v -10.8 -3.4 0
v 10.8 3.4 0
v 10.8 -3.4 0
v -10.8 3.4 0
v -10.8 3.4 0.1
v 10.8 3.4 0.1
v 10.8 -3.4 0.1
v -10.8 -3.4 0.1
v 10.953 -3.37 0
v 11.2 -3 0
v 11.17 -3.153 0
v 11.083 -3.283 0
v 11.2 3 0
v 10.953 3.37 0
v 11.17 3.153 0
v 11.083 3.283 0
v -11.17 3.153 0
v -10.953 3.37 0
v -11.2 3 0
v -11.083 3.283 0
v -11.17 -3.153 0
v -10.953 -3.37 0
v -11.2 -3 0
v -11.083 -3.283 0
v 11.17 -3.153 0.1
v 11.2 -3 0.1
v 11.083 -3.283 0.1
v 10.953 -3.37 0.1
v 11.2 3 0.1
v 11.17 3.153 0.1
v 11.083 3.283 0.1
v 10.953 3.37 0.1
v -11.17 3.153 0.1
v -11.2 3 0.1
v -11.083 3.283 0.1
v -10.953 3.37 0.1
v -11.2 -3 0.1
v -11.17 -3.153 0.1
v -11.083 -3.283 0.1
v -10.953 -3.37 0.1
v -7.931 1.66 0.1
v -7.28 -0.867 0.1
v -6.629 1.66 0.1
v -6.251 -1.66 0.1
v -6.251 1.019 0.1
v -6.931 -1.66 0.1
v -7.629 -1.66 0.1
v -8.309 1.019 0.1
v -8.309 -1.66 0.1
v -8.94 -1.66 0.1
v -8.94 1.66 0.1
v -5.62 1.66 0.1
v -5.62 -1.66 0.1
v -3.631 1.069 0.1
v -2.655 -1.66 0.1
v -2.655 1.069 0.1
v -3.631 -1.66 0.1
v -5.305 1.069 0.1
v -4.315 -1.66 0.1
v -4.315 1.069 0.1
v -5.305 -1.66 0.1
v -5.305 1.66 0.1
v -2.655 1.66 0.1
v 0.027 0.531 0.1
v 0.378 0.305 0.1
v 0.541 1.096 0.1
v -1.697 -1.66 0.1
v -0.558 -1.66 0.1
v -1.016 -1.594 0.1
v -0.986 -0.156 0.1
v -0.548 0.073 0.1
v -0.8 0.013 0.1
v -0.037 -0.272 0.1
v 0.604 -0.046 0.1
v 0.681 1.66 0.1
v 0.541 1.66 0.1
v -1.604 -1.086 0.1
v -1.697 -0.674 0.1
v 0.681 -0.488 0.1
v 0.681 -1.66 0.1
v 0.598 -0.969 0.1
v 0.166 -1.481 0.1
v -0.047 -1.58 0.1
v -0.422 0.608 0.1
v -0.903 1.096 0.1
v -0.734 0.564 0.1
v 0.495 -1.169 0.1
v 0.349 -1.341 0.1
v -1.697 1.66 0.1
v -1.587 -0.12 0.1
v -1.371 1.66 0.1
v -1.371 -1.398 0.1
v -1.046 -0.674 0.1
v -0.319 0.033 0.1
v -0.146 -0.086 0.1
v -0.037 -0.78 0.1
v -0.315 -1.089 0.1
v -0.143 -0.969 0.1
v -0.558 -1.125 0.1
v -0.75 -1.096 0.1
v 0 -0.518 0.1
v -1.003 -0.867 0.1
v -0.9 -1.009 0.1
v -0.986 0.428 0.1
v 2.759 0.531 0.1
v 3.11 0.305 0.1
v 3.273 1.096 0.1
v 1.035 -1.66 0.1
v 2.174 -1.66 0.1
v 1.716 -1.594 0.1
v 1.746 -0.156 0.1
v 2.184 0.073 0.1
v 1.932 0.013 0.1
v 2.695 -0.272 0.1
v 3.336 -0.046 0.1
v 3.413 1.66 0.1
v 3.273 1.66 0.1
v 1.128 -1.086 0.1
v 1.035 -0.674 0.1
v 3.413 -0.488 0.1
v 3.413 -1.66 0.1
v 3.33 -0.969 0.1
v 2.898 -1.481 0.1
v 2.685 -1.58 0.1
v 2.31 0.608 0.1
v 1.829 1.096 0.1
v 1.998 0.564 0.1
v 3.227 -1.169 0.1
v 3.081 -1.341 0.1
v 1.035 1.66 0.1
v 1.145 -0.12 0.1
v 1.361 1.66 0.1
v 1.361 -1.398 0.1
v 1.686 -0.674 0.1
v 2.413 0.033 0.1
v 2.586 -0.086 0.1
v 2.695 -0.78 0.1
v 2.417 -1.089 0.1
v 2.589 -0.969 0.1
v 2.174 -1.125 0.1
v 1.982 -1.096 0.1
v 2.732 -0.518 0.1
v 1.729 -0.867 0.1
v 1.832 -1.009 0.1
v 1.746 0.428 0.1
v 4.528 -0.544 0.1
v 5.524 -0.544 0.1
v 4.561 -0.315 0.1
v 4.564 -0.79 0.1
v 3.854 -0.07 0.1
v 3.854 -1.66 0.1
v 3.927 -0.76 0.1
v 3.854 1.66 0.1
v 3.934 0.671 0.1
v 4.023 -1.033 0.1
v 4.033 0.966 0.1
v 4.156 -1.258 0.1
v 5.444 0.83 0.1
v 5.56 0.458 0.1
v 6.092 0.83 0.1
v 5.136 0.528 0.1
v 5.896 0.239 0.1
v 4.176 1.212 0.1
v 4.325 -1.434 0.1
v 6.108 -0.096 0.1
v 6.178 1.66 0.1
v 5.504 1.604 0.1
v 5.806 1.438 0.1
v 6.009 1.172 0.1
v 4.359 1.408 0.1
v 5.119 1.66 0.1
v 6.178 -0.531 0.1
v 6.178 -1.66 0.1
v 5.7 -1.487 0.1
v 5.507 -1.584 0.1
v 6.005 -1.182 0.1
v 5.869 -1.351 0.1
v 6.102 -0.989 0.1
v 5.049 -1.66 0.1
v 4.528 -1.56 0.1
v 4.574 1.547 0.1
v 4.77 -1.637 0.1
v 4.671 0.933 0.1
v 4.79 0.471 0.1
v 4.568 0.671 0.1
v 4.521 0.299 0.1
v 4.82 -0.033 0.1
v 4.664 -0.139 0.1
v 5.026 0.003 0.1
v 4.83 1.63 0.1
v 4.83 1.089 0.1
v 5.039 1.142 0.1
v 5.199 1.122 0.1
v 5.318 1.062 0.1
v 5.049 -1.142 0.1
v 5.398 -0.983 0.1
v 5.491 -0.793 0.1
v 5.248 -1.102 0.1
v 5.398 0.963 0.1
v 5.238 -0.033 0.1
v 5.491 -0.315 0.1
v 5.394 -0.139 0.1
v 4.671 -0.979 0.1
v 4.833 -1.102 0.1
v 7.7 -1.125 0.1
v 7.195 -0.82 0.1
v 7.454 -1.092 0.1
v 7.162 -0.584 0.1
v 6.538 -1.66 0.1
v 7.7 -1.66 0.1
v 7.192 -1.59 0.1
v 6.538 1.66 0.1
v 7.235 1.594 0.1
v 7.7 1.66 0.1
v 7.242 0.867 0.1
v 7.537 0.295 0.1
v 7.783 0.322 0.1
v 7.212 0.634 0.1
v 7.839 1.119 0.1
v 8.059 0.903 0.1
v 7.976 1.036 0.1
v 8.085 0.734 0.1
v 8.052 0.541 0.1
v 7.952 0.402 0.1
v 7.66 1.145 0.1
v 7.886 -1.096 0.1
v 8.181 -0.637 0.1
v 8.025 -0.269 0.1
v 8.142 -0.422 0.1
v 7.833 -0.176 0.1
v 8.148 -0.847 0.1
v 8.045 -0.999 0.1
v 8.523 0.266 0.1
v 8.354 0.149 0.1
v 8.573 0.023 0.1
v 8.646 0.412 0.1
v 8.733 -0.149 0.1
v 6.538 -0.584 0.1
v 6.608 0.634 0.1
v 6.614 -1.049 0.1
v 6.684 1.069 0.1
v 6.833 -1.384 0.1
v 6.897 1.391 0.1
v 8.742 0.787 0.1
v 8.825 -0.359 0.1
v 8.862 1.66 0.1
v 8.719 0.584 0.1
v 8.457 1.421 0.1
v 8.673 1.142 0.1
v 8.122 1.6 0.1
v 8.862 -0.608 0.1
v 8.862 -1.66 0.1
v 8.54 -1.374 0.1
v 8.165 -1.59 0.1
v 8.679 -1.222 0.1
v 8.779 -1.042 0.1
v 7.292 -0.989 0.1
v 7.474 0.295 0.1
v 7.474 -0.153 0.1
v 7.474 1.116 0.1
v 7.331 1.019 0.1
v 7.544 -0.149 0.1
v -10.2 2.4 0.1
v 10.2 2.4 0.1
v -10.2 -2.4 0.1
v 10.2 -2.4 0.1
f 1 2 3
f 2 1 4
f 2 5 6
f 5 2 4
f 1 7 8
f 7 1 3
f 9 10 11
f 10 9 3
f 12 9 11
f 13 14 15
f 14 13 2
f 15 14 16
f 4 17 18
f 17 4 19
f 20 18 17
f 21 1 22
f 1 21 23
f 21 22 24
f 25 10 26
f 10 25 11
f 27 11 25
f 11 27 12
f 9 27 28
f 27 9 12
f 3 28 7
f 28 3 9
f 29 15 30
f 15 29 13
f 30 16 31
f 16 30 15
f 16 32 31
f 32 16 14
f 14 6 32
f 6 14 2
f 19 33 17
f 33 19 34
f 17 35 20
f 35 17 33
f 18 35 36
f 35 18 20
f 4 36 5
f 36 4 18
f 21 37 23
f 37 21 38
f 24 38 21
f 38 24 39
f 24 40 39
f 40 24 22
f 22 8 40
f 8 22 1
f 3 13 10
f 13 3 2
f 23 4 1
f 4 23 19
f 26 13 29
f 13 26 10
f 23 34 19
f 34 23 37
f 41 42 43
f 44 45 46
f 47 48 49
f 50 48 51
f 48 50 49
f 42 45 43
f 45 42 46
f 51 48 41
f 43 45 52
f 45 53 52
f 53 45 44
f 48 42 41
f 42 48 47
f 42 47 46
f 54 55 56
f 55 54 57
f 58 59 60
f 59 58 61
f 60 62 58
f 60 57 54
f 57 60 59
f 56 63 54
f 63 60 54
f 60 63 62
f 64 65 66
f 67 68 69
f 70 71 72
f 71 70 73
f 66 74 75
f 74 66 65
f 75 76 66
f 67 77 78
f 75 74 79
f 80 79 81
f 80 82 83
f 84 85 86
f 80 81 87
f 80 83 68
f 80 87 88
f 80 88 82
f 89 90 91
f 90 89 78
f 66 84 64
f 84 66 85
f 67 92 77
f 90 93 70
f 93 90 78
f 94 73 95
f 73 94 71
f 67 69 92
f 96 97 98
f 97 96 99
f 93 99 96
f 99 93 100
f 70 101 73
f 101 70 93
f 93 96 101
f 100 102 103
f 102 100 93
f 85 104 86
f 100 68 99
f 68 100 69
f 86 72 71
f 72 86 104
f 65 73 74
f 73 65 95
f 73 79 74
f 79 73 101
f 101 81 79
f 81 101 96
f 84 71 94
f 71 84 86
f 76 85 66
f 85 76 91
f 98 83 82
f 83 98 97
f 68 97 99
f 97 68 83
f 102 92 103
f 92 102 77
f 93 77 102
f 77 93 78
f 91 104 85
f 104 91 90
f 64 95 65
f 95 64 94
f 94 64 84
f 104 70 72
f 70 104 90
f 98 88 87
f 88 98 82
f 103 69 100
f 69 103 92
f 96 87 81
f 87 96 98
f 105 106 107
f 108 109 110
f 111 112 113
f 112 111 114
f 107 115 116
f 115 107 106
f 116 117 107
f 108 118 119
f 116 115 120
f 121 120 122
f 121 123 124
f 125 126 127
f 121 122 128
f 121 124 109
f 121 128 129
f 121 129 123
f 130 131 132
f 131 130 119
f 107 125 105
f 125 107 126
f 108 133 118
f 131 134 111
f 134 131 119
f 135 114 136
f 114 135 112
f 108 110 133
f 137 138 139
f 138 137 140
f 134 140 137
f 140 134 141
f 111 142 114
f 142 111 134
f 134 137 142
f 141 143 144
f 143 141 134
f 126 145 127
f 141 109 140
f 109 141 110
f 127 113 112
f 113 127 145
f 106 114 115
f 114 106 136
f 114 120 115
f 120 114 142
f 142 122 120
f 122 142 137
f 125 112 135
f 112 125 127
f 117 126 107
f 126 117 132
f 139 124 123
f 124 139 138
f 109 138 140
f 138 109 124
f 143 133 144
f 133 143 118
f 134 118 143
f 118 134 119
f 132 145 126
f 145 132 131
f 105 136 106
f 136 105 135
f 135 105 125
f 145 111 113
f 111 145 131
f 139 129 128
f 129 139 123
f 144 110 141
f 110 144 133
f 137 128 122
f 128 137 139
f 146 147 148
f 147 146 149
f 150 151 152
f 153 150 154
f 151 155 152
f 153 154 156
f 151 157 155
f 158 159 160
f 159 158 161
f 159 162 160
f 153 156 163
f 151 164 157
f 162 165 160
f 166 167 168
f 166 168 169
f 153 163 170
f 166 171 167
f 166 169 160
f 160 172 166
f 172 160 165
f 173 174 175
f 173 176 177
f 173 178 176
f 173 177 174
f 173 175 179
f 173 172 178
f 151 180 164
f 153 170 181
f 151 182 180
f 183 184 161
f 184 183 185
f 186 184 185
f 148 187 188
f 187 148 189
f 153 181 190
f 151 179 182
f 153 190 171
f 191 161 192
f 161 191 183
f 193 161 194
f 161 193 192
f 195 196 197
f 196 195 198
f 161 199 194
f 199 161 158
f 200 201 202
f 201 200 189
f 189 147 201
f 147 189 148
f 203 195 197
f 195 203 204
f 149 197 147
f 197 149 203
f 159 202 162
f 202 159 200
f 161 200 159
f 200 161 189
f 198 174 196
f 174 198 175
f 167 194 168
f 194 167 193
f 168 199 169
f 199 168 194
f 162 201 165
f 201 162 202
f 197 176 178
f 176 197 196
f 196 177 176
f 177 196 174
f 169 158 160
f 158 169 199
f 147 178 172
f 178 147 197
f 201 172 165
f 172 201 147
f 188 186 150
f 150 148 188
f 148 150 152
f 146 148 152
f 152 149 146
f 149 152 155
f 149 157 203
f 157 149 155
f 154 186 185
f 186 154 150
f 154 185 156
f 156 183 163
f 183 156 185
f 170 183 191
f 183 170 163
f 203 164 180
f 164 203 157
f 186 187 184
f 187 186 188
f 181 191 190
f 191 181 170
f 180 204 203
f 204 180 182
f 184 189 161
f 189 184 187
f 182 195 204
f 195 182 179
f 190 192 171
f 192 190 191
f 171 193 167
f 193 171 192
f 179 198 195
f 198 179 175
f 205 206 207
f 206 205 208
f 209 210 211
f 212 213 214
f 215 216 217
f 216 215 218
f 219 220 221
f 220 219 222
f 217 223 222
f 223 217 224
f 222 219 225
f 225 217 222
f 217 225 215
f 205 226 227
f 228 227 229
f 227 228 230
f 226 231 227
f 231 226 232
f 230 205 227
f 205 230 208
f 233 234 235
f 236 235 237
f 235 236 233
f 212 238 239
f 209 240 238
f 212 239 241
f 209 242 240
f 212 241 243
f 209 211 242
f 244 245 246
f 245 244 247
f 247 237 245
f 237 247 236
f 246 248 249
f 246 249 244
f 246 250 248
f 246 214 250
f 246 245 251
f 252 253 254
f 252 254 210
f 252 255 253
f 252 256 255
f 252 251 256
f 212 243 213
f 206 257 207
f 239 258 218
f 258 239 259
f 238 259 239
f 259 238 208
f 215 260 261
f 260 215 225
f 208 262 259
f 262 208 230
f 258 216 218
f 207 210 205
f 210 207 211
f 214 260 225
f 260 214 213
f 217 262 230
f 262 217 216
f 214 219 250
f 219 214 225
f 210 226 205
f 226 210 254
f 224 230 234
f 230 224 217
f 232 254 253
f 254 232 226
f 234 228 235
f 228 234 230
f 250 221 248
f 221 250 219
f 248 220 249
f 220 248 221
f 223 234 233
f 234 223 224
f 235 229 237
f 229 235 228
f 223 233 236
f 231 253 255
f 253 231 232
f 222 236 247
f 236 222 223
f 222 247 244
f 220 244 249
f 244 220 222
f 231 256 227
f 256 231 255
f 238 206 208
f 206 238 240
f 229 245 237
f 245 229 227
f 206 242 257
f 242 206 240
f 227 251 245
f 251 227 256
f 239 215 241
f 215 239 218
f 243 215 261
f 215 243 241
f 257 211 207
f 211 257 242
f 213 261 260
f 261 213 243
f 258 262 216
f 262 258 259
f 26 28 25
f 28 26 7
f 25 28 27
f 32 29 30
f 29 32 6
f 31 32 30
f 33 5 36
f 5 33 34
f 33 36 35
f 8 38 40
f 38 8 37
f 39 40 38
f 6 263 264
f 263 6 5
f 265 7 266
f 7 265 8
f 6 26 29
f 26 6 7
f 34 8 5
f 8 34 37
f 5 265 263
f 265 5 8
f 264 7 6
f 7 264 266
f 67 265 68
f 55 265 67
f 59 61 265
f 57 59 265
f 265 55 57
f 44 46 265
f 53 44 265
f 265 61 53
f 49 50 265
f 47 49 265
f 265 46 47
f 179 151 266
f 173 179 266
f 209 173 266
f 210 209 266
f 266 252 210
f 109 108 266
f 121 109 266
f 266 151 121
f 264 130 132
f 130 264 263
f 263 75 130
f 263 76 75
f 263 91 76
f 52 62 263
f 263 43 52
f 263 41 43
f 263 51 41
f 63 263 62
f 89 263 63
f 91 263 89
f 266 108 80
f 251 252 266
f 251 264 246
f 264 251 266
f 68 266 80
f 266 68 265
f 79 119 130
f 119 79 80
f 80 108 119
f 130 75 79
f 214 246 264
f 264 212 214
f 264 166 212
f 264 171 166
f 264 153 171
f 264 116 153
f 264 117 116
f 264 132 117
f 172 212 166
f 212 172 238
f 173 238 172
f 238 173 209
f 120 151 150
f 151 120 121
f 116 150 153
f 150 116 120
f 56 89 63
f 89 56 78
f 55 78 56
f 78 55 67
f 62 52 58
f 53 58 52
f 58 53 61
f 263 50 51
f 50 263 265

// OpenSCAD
use <../lib.scad>
use <../p/1-4chrd.scad>
use <../p/1-4cyli.scad>
use <../p/box3u12.scad>
use <../p/type-swiss721bt-bold-n3.scad>
use <../p/type-swiss721bt-bold-n5.scad>
use <../p/type-swiss721bt-bold-n6.scad>
use <../p/type-swiss721bt-bold-um.scad>
use <../p/type-swiss721bt-bold-ut.scad>
$fa=1; $fs=0.2;
function ldraw_lib__4121723j(realsolid=false) = [
// 0 Sticker  0.85 x  2.8 with Black "MT 5563" on White Background
// 0 Name: 4121723j.dat
// 0 Author: Ulrich Röder [UR]
// 0 !LDRAW_ORG Part UPDATE 2022-01
// 0 !LICENSE Licensed under CC BY 2.0 and CC BY 4.0 : see CAreadme.txt
// 
// 0 BFC CERTIFY CCW
  [0,"BFC","CERTIFY"],
  [0,"BFC","CCW"],
// 
// 0 !KEYWORDS Model Team, Racing Truck, Set 5563
// 
// 0 !HISTORY 2022-01-14 [PTadmin] Official Update 2022-01
// 
// 
// 0 // Body
// 
// 1 16 0 -0.25 0 27 0 0 0 0.25 0 0 0 8.5 box3u12.dat
  [1,16,0,-0.25,0,27,0,0,0,0.25,0,0,0,8.5, ldraw_lib__box3u12(realsolid)],
// 1 16 27 0 -7.5 1 0 0 0 -1 0 0 0 -1 1-4chrd.dat
  [1,16,27,0,-7.5,1,0,0,0,-1,0,0,0,-1, ldraw_lib__1_4chrd(realsolid)],
// 1 16 27 0 7.5 1 0 0 0 -1 0 0 0 1 1-4chrd.dat
  [1,16,27,0,7.5,1,0,0,0,-1,0,0,0,1, ldraw_lib__1_4chrd(realsolid)],
// 1 16 -27 0 7.5 -1 0 0 0 -1 0 0 0 1 1-4chrd.dat
  [1,16,-27,0,7.5,-1,0,0,0,-1,0,0,0,1, ldraw_lib__1_4chrd(realsolid)],
// 1 16 -27 0 -7.5 -1 0 0 0 -1 0 0 0 -1 1-4chrd.dat
  [1,16,-27,0,-7.5,-1,0,0,0,-1,0,0,0,-1, ldraw_lib__1_4chrd(realsolid)],
// 1 16 27 -0.25 -7.5 1 0 0 0 0.25 0 0 0 -1 1-4cyli.dat
  [1,16,27,-0.25,-7.5,1,0,0,0,0.25,0,0,0,-1, ldraw_lib__1_4cyli(realsolid)],
// 1 16 27 -0.25 7.5 1 0 0 0 0.25 0 0 0 1 1-4cyli.dat
  [1,16,27,-0.25,7.5,1,0,0,0,0.25,0,0,0,1, ldraw_lib__1_4cyli(realsolid)],
// 1 16 -27 -0.25 7.5 -1 0 0 0 0.25 0 0 0 1 1-4cyli.dat
  [1,16,-27,-0.25,7.5,-1,0,0,0,0.25,0,0,0,1, ldraw_lib__1_4cyli(realsolid)],
// 1 16 -27 -0.25 -7.5 -1 0 0 0 0.25 0 0 0 -1 1-4cyli.dat
  [1,16,-27,-0.25,-7.5,-1,0,0,0,0.25,0,0,0,-1, ldraw_lib__1_4cyli(realsolid)],
// 4 16 27 0 8.5 28 0 7.5 28 0 -7.5 27 0 -8.5
  [4,16,27,0,8.5,28,0,7.5,28,0,-7.5,27,0,-8.5],
// 4 16 -27 0 -8.5 -28 0 -7.5 -28 0 7.5 -27 0 8.5
  [4,16,-27,0,-8.5,-28,0,-7.5,-28,0,7.5,-27,0,8.5],
// 4 16 28 0 7.5 28 -0.25 7.5 28 -0.25 -7.5 28 0 -7.5
  [4,16,28,0,7.5,28,-0.25,7.5,28,-0.25,-7.5,28,0,-7.5],
// 4 16 -28 0 -7.5 -28 -0.25 -7.5 -28 -0.25 7.5 -28 0 7.5
  [4,16,-28,0,-7.5,-28,-0.25,-7.5,-28,-0.25,7.5,-28,0,7.5],
// 
// 0 // Frontface
// 0 // Text
// 1 15 -18.2 -0.25 0 8.3 0 0 0 1 0 0 0 8.3 type-swiss721bt-bold-um.dat
  [1,15,-18.2,-0.25,0,8.3,0,0,0,1,0,0,0,8.3, ldraw_lib__type_swiss721bt_bold_um(realsolid)],
// 1 15 -9.95 -0.25 0 8.3 0 0 0 1 0 0 0 8.3 type-swiss721bt-bold-ut.dat
  [1,15,-9.95,-0.25,0,8.3,0,0,0,1,0,0,0,8.3, ldraw_lib__type_swiss721bt_bold_ut(realsolid)],
// 1 15 -1.27 -0.25 0 8.3 0 0 0 1 0 0 0 8.3 type-swiss721bt-bold-n5.dat
  [1,15,-1.27,-0.25,0,8.3,0,0,0,1,0,0,0,8.3, ldraw_lib__type_swiss721bt_bold_n5(realsolid)],
// 1 15 5.56 -0.25 0 8.3 0 0 0 1 0 0 0 8.3 type-swiss721bt-bold-n5.dat
  [1,15,5.56,-0.25,0,8.3,0,0,0,1,0,0,0,8.3, ldraw_lib__type_swiss721bt_bold_n5(realsolid)],
// 1 15 12.54 -0.25 0 8.3 0 0 0 1 0 0 0 8.3 type-swiss721bt-bold-n6.dat
  [1,15,12.54,-0.25,0,8.3,0,0,0,1,0,0,0,8.3, ldraw_lib__type_swiss721bt_bold_n6(realsolid)],
// 1 15 19.25 -0.25 0 8.3 0 0 0 1 0 0 0 8.3 type-swiss721bt-bold-n3.dat
  [1,15,19.25,-0.25,0,8.3,0,0,0,1,0,0,0,8.3, ldraw_lib__type_swiss721bt_bold_n3(realsolid)],
// 
// 0 // Black
// 1 0 27 -0.25 -7.5 1 0 0 0 1 0 0 0 -1 1-4chrd.dat
  [1,0,27,-0.25,-7.5,1,0,0,0,1,0,0,0,-1, ldraw_lib__1_4chrd(realsolid)],
// 1 0 27 -0.25 7.5 1 0 0 0 1 0 0 0 1 1-4chrd.dat
  [1,0,27,-0.25,7.5,1,0,0,0,1,0,0,0,1, ldraw_lib__1_4chrd(realsolid)],
// 1 0 -27 -0.25 7.5 -1 0 0 0 1 0 0 0 1 1-4chrd.dat
  [1,0,-27,-0.25,7.5,-1,0,0,0,1,0,0,0,1, ldraw_lib__1_4chrd(realsolid)],
// 1 0 -27 -0.25 -7.5 -1 0 0 0 1 0 0 0 -1 1-4chrd.dat
  [1,0,-27,-0.25,-7.5,-1,0,0,0,1,0,0,0,-1, ldraw_lib__1_4chrd(realsolid)],
// 4 0 -27 -0.25 8.5 -25.5 -0.25 6 25.5 -0.25 6 27 -0.25 8.5
  [4,0,-27,-0.25,8.5,-25.5,-0.25,6,25.5,-0.25,6,27,-0.25,8.5],
// 4 0 25.5 -0.25 -6 -25.5 -0.25 -6 -27 -0.25 -8.5 27 -0.25 -8.5
  [4,0,25.5,-0.25,-6,-25.5,-0.25,-6,-27,-0.25,-8.5,27,-0.25,-8.5],
// 4 0 28 -0.25 -7.5 28 -0.25 7.5 27 -0.25 8.5 27 -0.25 -8.5
  [4,0,28,-0.25,-7.5,28,-0.25,7.5,27,-0.25,8.5,27,-0.25,-8.5],
// 4 0 -28 -0.25 7.5 -28 -0.25 -7.5 -27 -0.25 -8.5 -27 -0.25 8.5
  [4,0,-28,-0.25,7.5,-28,-0.25,-7.5,-27,-0.25,-8.5,-27,-0.25,8.5],
// 4 0 -27 -0.25 -8.5 -25.5 -0.25 -6 -25.5 -0.25 6 -27 -0.25 8.5
  [4,0,-27,-0.25,-8.5,-25.5,-0.25,-6,-25.5,-0.25,6,-27,-0.25,8.5],
// 4 0 25.5 -0.25 6 25.5 -0.25 -6 27 -0.25 -8.5 27 -0.25 8.5
  [4,0,25.5,-0.25,6,25.5,-0.25,-6,27,-0.25,-8.5,27,-0.25,8.5],
// 
// 0 // White
// 3 15 -4.2414 -0.25 -4.15 -25.5 -0.25 -6 -1.3945 -0.25 -4.15
  [3,15,-4.2414,-0.25,-4.15,-25.5,-0.25,-6,-1.3945,-0.25,-4.15],
// 3 15 -6.6383 -0.25 -4.15 -25.5 -0.25 -6 -4.2414 -0.25 -4.15
  [3,15,-6.6383,-0.25,-4.15,-25.5,-0.25,-6,-4.2414,-0.25,-4.15],
// 3 15 -10.7883 -0.25 -4.15 -13.2617 -0.25 -4.15 -25.5 -0.25 -6
  [3,15,-10.7883,-0.25,-4.15,-13.2617,-0.25,-4.15,-25.5,-0.25,-6],
// 3 15 -9.0785 -0.25 -4.15 -10.7883 -0.25 -4.15 -25.5 -0.25 -6
  [3,15,-9.0785,-0.25,-4.15,-10.7883,-0.25,-4.15,-25.5,-0.25,-6],
// 3 15 -25.5 -0.25 -6 -6.6383 -0.25 -4.15 -9.0785 -0.25 -4.15
  [3,15,-25.5,-0.25,-6,-6.6383,-0.25,-4.15,-9.0785,-0.25,-4.15],
// 3 15 -15.627 -0.25 -4.15 -17.3285 -0.25 -4.15 -25.5 -0.25 -6
  [3,15,-15.627,-0.25,-4.15,-17.3285,-0.25,-4.15,-25.5,-0.25,-6],
// 3 15 -14.05 -0.25 -4.15 -15.627 -0.25 -4.15 -25.5 -0.25 -6
  [3,15,-14.05,-0.25,-4.15,-15.627,-0.25,-4.15,-25.5,-0.25,-6],
// 3 15 -25.5 -0.25 -6 -13.2617 -0.25 -4.15 -14.05 -0.25 -4.15
  [3,15,-25.5,-0.25,-6,-13.2617,-0.25,-4.15,-14.05,-0.25,-4.15],
// 3 15 -20.773 -0.25 -4.15 -22.35 -0.25 -4.15 -25.5 -0.25 -6
  [3,15,-20.773,-0.25,-4.15,-22.35,-0.25,-4.15,-25.5,-0.25,-6],
// 3 15 -19.0715 -0.25 -4.15 -20.773 -0.25 -4.15 -25.5 -0.25 -6
  [3,15,-19.0715,-0.25,-4.15,-20.773,-0.25,-4.15,-25.5,-0.25,-6],
// 3 15 -25.5 -0.25 -6 -17.3285 -0.25 -4.15 -19.0715 -0.25 -4.15
  [3,15,-25.5,-0.25,-6,-17.3285,-0.25,-4.15,-19.0715,-0.25,-4.15],
// 3 15 12.623 -0.25 -4.15 9.635 -0.25 -4.15 25.5 -0.25 -6
  [3,15,12.623,-0.25,-4.15,9.635,-0.25,-4.15,25.5,-0.25,-6],
// 3 15 15.445 -0.25 -4.15 12.623 -0.25 -4.15 25.5 -0.25 -6
  [3,15,15.445,-0.25,-4.15,12.623,-0.25,-4.15,25.5,-0.25,-6],
// 3 15 16.345 -0.25 -4.15 15.445 -0.25 -4.15 25.5 -0.25 -6
  [3,15,16.345,-0.25,-4.15,15.445,-0.25,-4.15,25.5,-0.25,-6],
// 3 15 19.25 -0.25 -4.15 16.345 -0.25 -4.15 25.5 -0.25 -6
  [3,15,19.25,-0.25,-4.15,16.345,-0.25,-4.15,25.5,-0.25,-6],
// 3 15 25.5 -0.25 -6 22.155 -0.25 -4.15 19.25 -0.25 -4.15
  [3,15,25.5,-0.25,-6,22.155,-0.25,-4.15,19.25,-0.25,-4.15],
// 3 15 5.4355 -0.25 -4.15 2.5886 -0.25 -4.15 25.5 -0.25 -6
  [3,15,5.4355,-0.25,-4.15,2.5886,-0.25,-4.15,25.5,-0.25,-6],
// 3 15 8.5314 -0.25 -4.15 5.4355 -0.25 -4.15 25.5 -0.25 -6
  [3,15,8.5314,-0.25,-4.15,5.4355,-0.25,-4.15,25.5,-0.25,-6],
// 3 15 25.5 -0.25 -6 9.635 -0.25 -4.15 8.5314 -0.25 -4.15
  [3,15,25.5,-0.25,-6,9.635,-0.25,-4.15,8.5314,-0.25,-4.15],
// 4 15 25.5 -0.25 6 -25.5 -0.25 6 2.5886 -0.25 4.15 3.402 -0.25 4.15
  [4,15,25.5,-0.25,6,-25.5,-0.25,6,2.5886,-0.25,4.15,3.402,-0.25,4.15],
// 3 15 -25.5 -0.25 6 1.7014 -0.25 4.15 2.5886 -0.25 4.15
  [3,15,-25.5,-0.25,6,1.7014,-0.25,4.15,2.5886,-0.25,4.15],
// 3 15 -25.5 -0.25 6 1.3528 -0.25 4.15 1.7014 -0.25 4.15
  [3,15,-25.5,-0.25,6,1.3528,-0.25,4.15,1.7014,-0.25,4.15],
// 3 15 -25.5 -0.25 6 -3.428 -0.25 4.15 1.3528 -0.25 4.15
  [3,15,-25.5,-0.25,6,-3.428,-0.25,4.15,1.3528,-0.25,4.15],
// 3 15 -14.05 -0.25 4.15 -13.2617 -0.25 4.15 -25.5 -0.25 6
  [3,15,-14.05,-0.25,4.15,-13.2617,-0.25,4.15,-25.5,-0.25,6],
// 3 15 -25.5 -0.25 6 -16.5732 -0.25 4.15 -14.05 -0.25 4.15
  [3,15,-25.5,-0.25,6,-16.5732,-0.25,4.15,-14.05,-0.25,4.15],
// 3 15 -25.5 -0.25 6 -19.8268 -0.25 4.15 -16.5732 -0.25 4.15
  [3,15,-25.5,-0.25,6,-19.8268,-0.25,4.15,-16.5732,-0.25,4.15],
// 3 15 -25.5 -0.25 6 -22.35 -0.25 4.15 -19.8268 -0.25 4.15
  [3,15,-25.5,-0.25,6,-22.35,-0.25,4.15,-19.8268,-0.25,4.15],
// 3 15 -6.6383 -0.25 4.15 -25.5 -0.25 6 -13.2617 -0.25 4.15
  [3,15,-6.6383,-0.25,4.15,-25.5,-0.25,6,-13.2617,-0.25,4.15],
// 3 15 -4.2414 -0.25 4.15 -25.5 -0.25 6 -6.6383 -0.25 4.15
  [3,15,-4.2414,-0.25,4.15,-25.5,-0.25,6,-6.6383,-0.25,4.15],
// 3 15 -3.428 -0.25 4.15 -25.5 -0.25 6 -4.2414 -0.25 4.15
  [3,15,-3.428,-0.25,4.15,-25.5,-0.25,6,-4.2414,-0.25,4.15],
// 3 15 25.5 -0.25 -6 2.5886 -0.25 -4.15 1.7014 -0.25 -4.15
  [3,15,25.5,-0.25,-6,2.5886,-0.25,-4.15,1.7014,-0.25,-4.15],
// 3 15 22.155 -0.25 -1.5189 22.155 -0.25 -4.15 25.5 -0.25 -6
  [3,15,22.155,-0.25,-1.5189,22.155,-0.25,-4.15,25.5,-0.25,-6],
// 4 15 25.5 -0.25 6 22.155 -0.25 4.15 22.155 -0.25 -1.5189 25.5 -0.25 -6
  [4,15,25.5,-0.25,6,22.155,-0.25,4.15,22.155,-0.25,-1.5189,25.5,-0.25,-6],
// 4 15 25.5 -0.25 -6 1.7014 -0.25 -4.15 -1.3945 -0.25 -4.15 -25.5 -0.25 -6
  [4,15,25.5,-0.25,-6,1.7014,-0.25,-4.15,-1.3945,-0.25,-4.15,-25.5,-0.25,-6],
// 4 15 1.7014 -0.25 -1.2201 1.7014 -0.25 -4.15 2.5886 -0.25 -1.6849 2.5886 -0.25 4.15
  [4,15,1.7014,-0.25,-1.2201,1.7014,-0.25,-4.15,2.5886,-0.25,-1.6849,2.5886,-0.25,4.15],
// 3 15 1.7014 -0.25 -4.15 2.5886 -0.25 -4.15 2.5886 -0.25 -1.6849
  [3,15,1.7014,-0.25,-4.15,2.5886,-0.25,-4.15,2.5886,-0.25,-1.6849],
// 3 15 2.5886 -0.25 4.15 1.7014 -0.25 4.15 1.7014 -0.25 -1.2201
  [3,15,2.5886,-0.25,4.15,1.7014,-0.25,4.15,1.7014,-0.25,-1.2201],
// 3 15 19.25 -0.25 4.15 22.155 -0.25 4.15 25.5 -0.25 6
  [3,15,19.25,-0.25,4.15,22.155,-0.25,4.15,25.5,-0.25,6],
// 3 15 25.5 -0.25 6 16.345 -0.25 4.15 19.25 -0.25 4.15
  [3,15,25.5,-0.25,6,16.345,-0.25,4.15,19.25,-0.25,4.15],
// 3 15 25.5 -0.25 6 15.445 -0.25 4.15 16.345 -0.25 4.15
  [3,15,25.5,-0.25,6,15.445,-0.25,4.15,16.345,-0.25,4.15],
// 3 15 25.5 -0.25 6 12.7973 -0.25 4.15 15.445 -0.25 4.15
  [3,15,25.5,-0.25,6,12.7973,-0.25,4.15,15.445,-0.25,4.15],
// 3 15 25.5 -0.25 6 9.635 -0.25 4.15 12.7973 -0.25 4.15
  [3,15,25.5,-0.25,6,9.635,-0.25,4.15,12.7973,-0.25,4.15],
// 3 15 25.5 -0.25 6 8.5314 -0.25 4.15 9.635 -0.25 4.15
  [3,15,25.5,-0.25,6,8.5314,-0.25,4.15,9.635,-0.25,4.15],
// 3 15 25.5 -0.25 6 8.1828 -0.25 4.15 8.5314 -0.25 4.15
  [3,15,25.5,-0.25,6,8.1828,-0.25,4.15,8.5314,-0.25,4.15],
// 3 15 25.5 -0.25 6 3.402 -0.25 4.15 8.1828 -0.25 4.15
  [3,15,25.5,-0.25,6,3.402,-0.25,4.15,8.1828,-0.25,4.15],
// 4 15 16.345 -0.25 4.15 15.445 -0.25 4.15 15.445 -0.25 -1.328 16.345 -0.25 -1.4608
  [4,15,16.345,-0.25,4.15,15.445,-0.25,4.15,15.445,-0.25,-1.328,16.345,-0.25,-1.4608],
// 4 15 15.445 -0.25 -4.15 16.345 -0.25 -4.15 16.345 -0.25 -1.4608 15.445 -0.25 -1.328
  [4,15,15.445,-0.25,-4.15,16.345,-0.25,-4.15,16.345,-0.25,-1.4608,15.445,-0.25,-1.328],
// 4 15 8.5314 -0.25 -4.15 9.635 -0.25 -4.15 9.635 -0.25 -0.1743 8.5314 -0.25 -1.2201
  [4,15,8.5314,-0.25,-4.15,9.635,-0.25,-4.15,9.635,-0.25,-0.1743,8.5314,-0.25,-1.2201],
// 4 15 9.635 -0.25 4.15 8.5314 -0.25 4.15 8.5314 -0.25 -1.2201 9.635 -0.25 -0.1743
  [4,15,9.635,-0.25,4.15,8.5314,-0.25,4.15,8.5314,-0.25,-1.2201,9.635,-0.25,-0.1743],
// 4 15 -4.2414 -0.25 -1.6849 -4.2414 -0.25 4.15 -6.6383 -0.25 4.15 -6.6383 -0.25 2.6726
  [4,15,-4.2414,-0.25,-1.6849,-4.2414,-0.25,4.15,-6.6383,-0.25,4.15,-6.6383,-0.25,2.6726],
// 4 15 -4.2414 -0.25 -4.15 -4.2414 -0.25 -1.6849 -6.6383 -0.25 2.6726 -6.6383 -0.25 -4.15
  [4,15,-4.2414,-0.25,-4.15,-4.2414,-0.25,-1.6849,-6.6383,-0.25,2.6726,-6.6383,-0.25,-4.15],
// 3 15 -13.2617 -0.25 4.15 -14.05 -0.25 4.15 -13.2617 -0.25 2.6726
  [3,15,-13.2617,-0.25,4.15,-14.05,-0.25,4.15,-13.2617,-0.25,2.6726],
// 4 15 -14.05 -0.25 4.15 -14.05 -0.25 -4.15 -13.2617 -0.25 -4.15 -13.2617 -0.25 2.6726
  [4,15,-14.05,-0.25,4.15,-14.05,-0.25,-4.15,-13.2617,-0.25,-4.15,-13.2617,-0.25,2.6726],
// 4 15 -25.5 -0.25 -6 -22.35 -0.25 -4.15 -22.35 -0.25 4.15 -25.5 -0.25 6
  [4,15,-25.5,-0.25,-6,-22.35,-0.25,-4.15,-22.35,-0.25,4.15,-25.5,-0.25,6],
];
module ldraw_lib__4121723j(step=0, col=false, unit=2/5, alt=false, line=0.2, solid=!$preview)
    makepoly(ldraw_lib__4121723j(solid), step=step, col=col, unit=unit, alt=alt, line=line, solid=solid);
ldraw_lib__4121723j(line=0.2);
